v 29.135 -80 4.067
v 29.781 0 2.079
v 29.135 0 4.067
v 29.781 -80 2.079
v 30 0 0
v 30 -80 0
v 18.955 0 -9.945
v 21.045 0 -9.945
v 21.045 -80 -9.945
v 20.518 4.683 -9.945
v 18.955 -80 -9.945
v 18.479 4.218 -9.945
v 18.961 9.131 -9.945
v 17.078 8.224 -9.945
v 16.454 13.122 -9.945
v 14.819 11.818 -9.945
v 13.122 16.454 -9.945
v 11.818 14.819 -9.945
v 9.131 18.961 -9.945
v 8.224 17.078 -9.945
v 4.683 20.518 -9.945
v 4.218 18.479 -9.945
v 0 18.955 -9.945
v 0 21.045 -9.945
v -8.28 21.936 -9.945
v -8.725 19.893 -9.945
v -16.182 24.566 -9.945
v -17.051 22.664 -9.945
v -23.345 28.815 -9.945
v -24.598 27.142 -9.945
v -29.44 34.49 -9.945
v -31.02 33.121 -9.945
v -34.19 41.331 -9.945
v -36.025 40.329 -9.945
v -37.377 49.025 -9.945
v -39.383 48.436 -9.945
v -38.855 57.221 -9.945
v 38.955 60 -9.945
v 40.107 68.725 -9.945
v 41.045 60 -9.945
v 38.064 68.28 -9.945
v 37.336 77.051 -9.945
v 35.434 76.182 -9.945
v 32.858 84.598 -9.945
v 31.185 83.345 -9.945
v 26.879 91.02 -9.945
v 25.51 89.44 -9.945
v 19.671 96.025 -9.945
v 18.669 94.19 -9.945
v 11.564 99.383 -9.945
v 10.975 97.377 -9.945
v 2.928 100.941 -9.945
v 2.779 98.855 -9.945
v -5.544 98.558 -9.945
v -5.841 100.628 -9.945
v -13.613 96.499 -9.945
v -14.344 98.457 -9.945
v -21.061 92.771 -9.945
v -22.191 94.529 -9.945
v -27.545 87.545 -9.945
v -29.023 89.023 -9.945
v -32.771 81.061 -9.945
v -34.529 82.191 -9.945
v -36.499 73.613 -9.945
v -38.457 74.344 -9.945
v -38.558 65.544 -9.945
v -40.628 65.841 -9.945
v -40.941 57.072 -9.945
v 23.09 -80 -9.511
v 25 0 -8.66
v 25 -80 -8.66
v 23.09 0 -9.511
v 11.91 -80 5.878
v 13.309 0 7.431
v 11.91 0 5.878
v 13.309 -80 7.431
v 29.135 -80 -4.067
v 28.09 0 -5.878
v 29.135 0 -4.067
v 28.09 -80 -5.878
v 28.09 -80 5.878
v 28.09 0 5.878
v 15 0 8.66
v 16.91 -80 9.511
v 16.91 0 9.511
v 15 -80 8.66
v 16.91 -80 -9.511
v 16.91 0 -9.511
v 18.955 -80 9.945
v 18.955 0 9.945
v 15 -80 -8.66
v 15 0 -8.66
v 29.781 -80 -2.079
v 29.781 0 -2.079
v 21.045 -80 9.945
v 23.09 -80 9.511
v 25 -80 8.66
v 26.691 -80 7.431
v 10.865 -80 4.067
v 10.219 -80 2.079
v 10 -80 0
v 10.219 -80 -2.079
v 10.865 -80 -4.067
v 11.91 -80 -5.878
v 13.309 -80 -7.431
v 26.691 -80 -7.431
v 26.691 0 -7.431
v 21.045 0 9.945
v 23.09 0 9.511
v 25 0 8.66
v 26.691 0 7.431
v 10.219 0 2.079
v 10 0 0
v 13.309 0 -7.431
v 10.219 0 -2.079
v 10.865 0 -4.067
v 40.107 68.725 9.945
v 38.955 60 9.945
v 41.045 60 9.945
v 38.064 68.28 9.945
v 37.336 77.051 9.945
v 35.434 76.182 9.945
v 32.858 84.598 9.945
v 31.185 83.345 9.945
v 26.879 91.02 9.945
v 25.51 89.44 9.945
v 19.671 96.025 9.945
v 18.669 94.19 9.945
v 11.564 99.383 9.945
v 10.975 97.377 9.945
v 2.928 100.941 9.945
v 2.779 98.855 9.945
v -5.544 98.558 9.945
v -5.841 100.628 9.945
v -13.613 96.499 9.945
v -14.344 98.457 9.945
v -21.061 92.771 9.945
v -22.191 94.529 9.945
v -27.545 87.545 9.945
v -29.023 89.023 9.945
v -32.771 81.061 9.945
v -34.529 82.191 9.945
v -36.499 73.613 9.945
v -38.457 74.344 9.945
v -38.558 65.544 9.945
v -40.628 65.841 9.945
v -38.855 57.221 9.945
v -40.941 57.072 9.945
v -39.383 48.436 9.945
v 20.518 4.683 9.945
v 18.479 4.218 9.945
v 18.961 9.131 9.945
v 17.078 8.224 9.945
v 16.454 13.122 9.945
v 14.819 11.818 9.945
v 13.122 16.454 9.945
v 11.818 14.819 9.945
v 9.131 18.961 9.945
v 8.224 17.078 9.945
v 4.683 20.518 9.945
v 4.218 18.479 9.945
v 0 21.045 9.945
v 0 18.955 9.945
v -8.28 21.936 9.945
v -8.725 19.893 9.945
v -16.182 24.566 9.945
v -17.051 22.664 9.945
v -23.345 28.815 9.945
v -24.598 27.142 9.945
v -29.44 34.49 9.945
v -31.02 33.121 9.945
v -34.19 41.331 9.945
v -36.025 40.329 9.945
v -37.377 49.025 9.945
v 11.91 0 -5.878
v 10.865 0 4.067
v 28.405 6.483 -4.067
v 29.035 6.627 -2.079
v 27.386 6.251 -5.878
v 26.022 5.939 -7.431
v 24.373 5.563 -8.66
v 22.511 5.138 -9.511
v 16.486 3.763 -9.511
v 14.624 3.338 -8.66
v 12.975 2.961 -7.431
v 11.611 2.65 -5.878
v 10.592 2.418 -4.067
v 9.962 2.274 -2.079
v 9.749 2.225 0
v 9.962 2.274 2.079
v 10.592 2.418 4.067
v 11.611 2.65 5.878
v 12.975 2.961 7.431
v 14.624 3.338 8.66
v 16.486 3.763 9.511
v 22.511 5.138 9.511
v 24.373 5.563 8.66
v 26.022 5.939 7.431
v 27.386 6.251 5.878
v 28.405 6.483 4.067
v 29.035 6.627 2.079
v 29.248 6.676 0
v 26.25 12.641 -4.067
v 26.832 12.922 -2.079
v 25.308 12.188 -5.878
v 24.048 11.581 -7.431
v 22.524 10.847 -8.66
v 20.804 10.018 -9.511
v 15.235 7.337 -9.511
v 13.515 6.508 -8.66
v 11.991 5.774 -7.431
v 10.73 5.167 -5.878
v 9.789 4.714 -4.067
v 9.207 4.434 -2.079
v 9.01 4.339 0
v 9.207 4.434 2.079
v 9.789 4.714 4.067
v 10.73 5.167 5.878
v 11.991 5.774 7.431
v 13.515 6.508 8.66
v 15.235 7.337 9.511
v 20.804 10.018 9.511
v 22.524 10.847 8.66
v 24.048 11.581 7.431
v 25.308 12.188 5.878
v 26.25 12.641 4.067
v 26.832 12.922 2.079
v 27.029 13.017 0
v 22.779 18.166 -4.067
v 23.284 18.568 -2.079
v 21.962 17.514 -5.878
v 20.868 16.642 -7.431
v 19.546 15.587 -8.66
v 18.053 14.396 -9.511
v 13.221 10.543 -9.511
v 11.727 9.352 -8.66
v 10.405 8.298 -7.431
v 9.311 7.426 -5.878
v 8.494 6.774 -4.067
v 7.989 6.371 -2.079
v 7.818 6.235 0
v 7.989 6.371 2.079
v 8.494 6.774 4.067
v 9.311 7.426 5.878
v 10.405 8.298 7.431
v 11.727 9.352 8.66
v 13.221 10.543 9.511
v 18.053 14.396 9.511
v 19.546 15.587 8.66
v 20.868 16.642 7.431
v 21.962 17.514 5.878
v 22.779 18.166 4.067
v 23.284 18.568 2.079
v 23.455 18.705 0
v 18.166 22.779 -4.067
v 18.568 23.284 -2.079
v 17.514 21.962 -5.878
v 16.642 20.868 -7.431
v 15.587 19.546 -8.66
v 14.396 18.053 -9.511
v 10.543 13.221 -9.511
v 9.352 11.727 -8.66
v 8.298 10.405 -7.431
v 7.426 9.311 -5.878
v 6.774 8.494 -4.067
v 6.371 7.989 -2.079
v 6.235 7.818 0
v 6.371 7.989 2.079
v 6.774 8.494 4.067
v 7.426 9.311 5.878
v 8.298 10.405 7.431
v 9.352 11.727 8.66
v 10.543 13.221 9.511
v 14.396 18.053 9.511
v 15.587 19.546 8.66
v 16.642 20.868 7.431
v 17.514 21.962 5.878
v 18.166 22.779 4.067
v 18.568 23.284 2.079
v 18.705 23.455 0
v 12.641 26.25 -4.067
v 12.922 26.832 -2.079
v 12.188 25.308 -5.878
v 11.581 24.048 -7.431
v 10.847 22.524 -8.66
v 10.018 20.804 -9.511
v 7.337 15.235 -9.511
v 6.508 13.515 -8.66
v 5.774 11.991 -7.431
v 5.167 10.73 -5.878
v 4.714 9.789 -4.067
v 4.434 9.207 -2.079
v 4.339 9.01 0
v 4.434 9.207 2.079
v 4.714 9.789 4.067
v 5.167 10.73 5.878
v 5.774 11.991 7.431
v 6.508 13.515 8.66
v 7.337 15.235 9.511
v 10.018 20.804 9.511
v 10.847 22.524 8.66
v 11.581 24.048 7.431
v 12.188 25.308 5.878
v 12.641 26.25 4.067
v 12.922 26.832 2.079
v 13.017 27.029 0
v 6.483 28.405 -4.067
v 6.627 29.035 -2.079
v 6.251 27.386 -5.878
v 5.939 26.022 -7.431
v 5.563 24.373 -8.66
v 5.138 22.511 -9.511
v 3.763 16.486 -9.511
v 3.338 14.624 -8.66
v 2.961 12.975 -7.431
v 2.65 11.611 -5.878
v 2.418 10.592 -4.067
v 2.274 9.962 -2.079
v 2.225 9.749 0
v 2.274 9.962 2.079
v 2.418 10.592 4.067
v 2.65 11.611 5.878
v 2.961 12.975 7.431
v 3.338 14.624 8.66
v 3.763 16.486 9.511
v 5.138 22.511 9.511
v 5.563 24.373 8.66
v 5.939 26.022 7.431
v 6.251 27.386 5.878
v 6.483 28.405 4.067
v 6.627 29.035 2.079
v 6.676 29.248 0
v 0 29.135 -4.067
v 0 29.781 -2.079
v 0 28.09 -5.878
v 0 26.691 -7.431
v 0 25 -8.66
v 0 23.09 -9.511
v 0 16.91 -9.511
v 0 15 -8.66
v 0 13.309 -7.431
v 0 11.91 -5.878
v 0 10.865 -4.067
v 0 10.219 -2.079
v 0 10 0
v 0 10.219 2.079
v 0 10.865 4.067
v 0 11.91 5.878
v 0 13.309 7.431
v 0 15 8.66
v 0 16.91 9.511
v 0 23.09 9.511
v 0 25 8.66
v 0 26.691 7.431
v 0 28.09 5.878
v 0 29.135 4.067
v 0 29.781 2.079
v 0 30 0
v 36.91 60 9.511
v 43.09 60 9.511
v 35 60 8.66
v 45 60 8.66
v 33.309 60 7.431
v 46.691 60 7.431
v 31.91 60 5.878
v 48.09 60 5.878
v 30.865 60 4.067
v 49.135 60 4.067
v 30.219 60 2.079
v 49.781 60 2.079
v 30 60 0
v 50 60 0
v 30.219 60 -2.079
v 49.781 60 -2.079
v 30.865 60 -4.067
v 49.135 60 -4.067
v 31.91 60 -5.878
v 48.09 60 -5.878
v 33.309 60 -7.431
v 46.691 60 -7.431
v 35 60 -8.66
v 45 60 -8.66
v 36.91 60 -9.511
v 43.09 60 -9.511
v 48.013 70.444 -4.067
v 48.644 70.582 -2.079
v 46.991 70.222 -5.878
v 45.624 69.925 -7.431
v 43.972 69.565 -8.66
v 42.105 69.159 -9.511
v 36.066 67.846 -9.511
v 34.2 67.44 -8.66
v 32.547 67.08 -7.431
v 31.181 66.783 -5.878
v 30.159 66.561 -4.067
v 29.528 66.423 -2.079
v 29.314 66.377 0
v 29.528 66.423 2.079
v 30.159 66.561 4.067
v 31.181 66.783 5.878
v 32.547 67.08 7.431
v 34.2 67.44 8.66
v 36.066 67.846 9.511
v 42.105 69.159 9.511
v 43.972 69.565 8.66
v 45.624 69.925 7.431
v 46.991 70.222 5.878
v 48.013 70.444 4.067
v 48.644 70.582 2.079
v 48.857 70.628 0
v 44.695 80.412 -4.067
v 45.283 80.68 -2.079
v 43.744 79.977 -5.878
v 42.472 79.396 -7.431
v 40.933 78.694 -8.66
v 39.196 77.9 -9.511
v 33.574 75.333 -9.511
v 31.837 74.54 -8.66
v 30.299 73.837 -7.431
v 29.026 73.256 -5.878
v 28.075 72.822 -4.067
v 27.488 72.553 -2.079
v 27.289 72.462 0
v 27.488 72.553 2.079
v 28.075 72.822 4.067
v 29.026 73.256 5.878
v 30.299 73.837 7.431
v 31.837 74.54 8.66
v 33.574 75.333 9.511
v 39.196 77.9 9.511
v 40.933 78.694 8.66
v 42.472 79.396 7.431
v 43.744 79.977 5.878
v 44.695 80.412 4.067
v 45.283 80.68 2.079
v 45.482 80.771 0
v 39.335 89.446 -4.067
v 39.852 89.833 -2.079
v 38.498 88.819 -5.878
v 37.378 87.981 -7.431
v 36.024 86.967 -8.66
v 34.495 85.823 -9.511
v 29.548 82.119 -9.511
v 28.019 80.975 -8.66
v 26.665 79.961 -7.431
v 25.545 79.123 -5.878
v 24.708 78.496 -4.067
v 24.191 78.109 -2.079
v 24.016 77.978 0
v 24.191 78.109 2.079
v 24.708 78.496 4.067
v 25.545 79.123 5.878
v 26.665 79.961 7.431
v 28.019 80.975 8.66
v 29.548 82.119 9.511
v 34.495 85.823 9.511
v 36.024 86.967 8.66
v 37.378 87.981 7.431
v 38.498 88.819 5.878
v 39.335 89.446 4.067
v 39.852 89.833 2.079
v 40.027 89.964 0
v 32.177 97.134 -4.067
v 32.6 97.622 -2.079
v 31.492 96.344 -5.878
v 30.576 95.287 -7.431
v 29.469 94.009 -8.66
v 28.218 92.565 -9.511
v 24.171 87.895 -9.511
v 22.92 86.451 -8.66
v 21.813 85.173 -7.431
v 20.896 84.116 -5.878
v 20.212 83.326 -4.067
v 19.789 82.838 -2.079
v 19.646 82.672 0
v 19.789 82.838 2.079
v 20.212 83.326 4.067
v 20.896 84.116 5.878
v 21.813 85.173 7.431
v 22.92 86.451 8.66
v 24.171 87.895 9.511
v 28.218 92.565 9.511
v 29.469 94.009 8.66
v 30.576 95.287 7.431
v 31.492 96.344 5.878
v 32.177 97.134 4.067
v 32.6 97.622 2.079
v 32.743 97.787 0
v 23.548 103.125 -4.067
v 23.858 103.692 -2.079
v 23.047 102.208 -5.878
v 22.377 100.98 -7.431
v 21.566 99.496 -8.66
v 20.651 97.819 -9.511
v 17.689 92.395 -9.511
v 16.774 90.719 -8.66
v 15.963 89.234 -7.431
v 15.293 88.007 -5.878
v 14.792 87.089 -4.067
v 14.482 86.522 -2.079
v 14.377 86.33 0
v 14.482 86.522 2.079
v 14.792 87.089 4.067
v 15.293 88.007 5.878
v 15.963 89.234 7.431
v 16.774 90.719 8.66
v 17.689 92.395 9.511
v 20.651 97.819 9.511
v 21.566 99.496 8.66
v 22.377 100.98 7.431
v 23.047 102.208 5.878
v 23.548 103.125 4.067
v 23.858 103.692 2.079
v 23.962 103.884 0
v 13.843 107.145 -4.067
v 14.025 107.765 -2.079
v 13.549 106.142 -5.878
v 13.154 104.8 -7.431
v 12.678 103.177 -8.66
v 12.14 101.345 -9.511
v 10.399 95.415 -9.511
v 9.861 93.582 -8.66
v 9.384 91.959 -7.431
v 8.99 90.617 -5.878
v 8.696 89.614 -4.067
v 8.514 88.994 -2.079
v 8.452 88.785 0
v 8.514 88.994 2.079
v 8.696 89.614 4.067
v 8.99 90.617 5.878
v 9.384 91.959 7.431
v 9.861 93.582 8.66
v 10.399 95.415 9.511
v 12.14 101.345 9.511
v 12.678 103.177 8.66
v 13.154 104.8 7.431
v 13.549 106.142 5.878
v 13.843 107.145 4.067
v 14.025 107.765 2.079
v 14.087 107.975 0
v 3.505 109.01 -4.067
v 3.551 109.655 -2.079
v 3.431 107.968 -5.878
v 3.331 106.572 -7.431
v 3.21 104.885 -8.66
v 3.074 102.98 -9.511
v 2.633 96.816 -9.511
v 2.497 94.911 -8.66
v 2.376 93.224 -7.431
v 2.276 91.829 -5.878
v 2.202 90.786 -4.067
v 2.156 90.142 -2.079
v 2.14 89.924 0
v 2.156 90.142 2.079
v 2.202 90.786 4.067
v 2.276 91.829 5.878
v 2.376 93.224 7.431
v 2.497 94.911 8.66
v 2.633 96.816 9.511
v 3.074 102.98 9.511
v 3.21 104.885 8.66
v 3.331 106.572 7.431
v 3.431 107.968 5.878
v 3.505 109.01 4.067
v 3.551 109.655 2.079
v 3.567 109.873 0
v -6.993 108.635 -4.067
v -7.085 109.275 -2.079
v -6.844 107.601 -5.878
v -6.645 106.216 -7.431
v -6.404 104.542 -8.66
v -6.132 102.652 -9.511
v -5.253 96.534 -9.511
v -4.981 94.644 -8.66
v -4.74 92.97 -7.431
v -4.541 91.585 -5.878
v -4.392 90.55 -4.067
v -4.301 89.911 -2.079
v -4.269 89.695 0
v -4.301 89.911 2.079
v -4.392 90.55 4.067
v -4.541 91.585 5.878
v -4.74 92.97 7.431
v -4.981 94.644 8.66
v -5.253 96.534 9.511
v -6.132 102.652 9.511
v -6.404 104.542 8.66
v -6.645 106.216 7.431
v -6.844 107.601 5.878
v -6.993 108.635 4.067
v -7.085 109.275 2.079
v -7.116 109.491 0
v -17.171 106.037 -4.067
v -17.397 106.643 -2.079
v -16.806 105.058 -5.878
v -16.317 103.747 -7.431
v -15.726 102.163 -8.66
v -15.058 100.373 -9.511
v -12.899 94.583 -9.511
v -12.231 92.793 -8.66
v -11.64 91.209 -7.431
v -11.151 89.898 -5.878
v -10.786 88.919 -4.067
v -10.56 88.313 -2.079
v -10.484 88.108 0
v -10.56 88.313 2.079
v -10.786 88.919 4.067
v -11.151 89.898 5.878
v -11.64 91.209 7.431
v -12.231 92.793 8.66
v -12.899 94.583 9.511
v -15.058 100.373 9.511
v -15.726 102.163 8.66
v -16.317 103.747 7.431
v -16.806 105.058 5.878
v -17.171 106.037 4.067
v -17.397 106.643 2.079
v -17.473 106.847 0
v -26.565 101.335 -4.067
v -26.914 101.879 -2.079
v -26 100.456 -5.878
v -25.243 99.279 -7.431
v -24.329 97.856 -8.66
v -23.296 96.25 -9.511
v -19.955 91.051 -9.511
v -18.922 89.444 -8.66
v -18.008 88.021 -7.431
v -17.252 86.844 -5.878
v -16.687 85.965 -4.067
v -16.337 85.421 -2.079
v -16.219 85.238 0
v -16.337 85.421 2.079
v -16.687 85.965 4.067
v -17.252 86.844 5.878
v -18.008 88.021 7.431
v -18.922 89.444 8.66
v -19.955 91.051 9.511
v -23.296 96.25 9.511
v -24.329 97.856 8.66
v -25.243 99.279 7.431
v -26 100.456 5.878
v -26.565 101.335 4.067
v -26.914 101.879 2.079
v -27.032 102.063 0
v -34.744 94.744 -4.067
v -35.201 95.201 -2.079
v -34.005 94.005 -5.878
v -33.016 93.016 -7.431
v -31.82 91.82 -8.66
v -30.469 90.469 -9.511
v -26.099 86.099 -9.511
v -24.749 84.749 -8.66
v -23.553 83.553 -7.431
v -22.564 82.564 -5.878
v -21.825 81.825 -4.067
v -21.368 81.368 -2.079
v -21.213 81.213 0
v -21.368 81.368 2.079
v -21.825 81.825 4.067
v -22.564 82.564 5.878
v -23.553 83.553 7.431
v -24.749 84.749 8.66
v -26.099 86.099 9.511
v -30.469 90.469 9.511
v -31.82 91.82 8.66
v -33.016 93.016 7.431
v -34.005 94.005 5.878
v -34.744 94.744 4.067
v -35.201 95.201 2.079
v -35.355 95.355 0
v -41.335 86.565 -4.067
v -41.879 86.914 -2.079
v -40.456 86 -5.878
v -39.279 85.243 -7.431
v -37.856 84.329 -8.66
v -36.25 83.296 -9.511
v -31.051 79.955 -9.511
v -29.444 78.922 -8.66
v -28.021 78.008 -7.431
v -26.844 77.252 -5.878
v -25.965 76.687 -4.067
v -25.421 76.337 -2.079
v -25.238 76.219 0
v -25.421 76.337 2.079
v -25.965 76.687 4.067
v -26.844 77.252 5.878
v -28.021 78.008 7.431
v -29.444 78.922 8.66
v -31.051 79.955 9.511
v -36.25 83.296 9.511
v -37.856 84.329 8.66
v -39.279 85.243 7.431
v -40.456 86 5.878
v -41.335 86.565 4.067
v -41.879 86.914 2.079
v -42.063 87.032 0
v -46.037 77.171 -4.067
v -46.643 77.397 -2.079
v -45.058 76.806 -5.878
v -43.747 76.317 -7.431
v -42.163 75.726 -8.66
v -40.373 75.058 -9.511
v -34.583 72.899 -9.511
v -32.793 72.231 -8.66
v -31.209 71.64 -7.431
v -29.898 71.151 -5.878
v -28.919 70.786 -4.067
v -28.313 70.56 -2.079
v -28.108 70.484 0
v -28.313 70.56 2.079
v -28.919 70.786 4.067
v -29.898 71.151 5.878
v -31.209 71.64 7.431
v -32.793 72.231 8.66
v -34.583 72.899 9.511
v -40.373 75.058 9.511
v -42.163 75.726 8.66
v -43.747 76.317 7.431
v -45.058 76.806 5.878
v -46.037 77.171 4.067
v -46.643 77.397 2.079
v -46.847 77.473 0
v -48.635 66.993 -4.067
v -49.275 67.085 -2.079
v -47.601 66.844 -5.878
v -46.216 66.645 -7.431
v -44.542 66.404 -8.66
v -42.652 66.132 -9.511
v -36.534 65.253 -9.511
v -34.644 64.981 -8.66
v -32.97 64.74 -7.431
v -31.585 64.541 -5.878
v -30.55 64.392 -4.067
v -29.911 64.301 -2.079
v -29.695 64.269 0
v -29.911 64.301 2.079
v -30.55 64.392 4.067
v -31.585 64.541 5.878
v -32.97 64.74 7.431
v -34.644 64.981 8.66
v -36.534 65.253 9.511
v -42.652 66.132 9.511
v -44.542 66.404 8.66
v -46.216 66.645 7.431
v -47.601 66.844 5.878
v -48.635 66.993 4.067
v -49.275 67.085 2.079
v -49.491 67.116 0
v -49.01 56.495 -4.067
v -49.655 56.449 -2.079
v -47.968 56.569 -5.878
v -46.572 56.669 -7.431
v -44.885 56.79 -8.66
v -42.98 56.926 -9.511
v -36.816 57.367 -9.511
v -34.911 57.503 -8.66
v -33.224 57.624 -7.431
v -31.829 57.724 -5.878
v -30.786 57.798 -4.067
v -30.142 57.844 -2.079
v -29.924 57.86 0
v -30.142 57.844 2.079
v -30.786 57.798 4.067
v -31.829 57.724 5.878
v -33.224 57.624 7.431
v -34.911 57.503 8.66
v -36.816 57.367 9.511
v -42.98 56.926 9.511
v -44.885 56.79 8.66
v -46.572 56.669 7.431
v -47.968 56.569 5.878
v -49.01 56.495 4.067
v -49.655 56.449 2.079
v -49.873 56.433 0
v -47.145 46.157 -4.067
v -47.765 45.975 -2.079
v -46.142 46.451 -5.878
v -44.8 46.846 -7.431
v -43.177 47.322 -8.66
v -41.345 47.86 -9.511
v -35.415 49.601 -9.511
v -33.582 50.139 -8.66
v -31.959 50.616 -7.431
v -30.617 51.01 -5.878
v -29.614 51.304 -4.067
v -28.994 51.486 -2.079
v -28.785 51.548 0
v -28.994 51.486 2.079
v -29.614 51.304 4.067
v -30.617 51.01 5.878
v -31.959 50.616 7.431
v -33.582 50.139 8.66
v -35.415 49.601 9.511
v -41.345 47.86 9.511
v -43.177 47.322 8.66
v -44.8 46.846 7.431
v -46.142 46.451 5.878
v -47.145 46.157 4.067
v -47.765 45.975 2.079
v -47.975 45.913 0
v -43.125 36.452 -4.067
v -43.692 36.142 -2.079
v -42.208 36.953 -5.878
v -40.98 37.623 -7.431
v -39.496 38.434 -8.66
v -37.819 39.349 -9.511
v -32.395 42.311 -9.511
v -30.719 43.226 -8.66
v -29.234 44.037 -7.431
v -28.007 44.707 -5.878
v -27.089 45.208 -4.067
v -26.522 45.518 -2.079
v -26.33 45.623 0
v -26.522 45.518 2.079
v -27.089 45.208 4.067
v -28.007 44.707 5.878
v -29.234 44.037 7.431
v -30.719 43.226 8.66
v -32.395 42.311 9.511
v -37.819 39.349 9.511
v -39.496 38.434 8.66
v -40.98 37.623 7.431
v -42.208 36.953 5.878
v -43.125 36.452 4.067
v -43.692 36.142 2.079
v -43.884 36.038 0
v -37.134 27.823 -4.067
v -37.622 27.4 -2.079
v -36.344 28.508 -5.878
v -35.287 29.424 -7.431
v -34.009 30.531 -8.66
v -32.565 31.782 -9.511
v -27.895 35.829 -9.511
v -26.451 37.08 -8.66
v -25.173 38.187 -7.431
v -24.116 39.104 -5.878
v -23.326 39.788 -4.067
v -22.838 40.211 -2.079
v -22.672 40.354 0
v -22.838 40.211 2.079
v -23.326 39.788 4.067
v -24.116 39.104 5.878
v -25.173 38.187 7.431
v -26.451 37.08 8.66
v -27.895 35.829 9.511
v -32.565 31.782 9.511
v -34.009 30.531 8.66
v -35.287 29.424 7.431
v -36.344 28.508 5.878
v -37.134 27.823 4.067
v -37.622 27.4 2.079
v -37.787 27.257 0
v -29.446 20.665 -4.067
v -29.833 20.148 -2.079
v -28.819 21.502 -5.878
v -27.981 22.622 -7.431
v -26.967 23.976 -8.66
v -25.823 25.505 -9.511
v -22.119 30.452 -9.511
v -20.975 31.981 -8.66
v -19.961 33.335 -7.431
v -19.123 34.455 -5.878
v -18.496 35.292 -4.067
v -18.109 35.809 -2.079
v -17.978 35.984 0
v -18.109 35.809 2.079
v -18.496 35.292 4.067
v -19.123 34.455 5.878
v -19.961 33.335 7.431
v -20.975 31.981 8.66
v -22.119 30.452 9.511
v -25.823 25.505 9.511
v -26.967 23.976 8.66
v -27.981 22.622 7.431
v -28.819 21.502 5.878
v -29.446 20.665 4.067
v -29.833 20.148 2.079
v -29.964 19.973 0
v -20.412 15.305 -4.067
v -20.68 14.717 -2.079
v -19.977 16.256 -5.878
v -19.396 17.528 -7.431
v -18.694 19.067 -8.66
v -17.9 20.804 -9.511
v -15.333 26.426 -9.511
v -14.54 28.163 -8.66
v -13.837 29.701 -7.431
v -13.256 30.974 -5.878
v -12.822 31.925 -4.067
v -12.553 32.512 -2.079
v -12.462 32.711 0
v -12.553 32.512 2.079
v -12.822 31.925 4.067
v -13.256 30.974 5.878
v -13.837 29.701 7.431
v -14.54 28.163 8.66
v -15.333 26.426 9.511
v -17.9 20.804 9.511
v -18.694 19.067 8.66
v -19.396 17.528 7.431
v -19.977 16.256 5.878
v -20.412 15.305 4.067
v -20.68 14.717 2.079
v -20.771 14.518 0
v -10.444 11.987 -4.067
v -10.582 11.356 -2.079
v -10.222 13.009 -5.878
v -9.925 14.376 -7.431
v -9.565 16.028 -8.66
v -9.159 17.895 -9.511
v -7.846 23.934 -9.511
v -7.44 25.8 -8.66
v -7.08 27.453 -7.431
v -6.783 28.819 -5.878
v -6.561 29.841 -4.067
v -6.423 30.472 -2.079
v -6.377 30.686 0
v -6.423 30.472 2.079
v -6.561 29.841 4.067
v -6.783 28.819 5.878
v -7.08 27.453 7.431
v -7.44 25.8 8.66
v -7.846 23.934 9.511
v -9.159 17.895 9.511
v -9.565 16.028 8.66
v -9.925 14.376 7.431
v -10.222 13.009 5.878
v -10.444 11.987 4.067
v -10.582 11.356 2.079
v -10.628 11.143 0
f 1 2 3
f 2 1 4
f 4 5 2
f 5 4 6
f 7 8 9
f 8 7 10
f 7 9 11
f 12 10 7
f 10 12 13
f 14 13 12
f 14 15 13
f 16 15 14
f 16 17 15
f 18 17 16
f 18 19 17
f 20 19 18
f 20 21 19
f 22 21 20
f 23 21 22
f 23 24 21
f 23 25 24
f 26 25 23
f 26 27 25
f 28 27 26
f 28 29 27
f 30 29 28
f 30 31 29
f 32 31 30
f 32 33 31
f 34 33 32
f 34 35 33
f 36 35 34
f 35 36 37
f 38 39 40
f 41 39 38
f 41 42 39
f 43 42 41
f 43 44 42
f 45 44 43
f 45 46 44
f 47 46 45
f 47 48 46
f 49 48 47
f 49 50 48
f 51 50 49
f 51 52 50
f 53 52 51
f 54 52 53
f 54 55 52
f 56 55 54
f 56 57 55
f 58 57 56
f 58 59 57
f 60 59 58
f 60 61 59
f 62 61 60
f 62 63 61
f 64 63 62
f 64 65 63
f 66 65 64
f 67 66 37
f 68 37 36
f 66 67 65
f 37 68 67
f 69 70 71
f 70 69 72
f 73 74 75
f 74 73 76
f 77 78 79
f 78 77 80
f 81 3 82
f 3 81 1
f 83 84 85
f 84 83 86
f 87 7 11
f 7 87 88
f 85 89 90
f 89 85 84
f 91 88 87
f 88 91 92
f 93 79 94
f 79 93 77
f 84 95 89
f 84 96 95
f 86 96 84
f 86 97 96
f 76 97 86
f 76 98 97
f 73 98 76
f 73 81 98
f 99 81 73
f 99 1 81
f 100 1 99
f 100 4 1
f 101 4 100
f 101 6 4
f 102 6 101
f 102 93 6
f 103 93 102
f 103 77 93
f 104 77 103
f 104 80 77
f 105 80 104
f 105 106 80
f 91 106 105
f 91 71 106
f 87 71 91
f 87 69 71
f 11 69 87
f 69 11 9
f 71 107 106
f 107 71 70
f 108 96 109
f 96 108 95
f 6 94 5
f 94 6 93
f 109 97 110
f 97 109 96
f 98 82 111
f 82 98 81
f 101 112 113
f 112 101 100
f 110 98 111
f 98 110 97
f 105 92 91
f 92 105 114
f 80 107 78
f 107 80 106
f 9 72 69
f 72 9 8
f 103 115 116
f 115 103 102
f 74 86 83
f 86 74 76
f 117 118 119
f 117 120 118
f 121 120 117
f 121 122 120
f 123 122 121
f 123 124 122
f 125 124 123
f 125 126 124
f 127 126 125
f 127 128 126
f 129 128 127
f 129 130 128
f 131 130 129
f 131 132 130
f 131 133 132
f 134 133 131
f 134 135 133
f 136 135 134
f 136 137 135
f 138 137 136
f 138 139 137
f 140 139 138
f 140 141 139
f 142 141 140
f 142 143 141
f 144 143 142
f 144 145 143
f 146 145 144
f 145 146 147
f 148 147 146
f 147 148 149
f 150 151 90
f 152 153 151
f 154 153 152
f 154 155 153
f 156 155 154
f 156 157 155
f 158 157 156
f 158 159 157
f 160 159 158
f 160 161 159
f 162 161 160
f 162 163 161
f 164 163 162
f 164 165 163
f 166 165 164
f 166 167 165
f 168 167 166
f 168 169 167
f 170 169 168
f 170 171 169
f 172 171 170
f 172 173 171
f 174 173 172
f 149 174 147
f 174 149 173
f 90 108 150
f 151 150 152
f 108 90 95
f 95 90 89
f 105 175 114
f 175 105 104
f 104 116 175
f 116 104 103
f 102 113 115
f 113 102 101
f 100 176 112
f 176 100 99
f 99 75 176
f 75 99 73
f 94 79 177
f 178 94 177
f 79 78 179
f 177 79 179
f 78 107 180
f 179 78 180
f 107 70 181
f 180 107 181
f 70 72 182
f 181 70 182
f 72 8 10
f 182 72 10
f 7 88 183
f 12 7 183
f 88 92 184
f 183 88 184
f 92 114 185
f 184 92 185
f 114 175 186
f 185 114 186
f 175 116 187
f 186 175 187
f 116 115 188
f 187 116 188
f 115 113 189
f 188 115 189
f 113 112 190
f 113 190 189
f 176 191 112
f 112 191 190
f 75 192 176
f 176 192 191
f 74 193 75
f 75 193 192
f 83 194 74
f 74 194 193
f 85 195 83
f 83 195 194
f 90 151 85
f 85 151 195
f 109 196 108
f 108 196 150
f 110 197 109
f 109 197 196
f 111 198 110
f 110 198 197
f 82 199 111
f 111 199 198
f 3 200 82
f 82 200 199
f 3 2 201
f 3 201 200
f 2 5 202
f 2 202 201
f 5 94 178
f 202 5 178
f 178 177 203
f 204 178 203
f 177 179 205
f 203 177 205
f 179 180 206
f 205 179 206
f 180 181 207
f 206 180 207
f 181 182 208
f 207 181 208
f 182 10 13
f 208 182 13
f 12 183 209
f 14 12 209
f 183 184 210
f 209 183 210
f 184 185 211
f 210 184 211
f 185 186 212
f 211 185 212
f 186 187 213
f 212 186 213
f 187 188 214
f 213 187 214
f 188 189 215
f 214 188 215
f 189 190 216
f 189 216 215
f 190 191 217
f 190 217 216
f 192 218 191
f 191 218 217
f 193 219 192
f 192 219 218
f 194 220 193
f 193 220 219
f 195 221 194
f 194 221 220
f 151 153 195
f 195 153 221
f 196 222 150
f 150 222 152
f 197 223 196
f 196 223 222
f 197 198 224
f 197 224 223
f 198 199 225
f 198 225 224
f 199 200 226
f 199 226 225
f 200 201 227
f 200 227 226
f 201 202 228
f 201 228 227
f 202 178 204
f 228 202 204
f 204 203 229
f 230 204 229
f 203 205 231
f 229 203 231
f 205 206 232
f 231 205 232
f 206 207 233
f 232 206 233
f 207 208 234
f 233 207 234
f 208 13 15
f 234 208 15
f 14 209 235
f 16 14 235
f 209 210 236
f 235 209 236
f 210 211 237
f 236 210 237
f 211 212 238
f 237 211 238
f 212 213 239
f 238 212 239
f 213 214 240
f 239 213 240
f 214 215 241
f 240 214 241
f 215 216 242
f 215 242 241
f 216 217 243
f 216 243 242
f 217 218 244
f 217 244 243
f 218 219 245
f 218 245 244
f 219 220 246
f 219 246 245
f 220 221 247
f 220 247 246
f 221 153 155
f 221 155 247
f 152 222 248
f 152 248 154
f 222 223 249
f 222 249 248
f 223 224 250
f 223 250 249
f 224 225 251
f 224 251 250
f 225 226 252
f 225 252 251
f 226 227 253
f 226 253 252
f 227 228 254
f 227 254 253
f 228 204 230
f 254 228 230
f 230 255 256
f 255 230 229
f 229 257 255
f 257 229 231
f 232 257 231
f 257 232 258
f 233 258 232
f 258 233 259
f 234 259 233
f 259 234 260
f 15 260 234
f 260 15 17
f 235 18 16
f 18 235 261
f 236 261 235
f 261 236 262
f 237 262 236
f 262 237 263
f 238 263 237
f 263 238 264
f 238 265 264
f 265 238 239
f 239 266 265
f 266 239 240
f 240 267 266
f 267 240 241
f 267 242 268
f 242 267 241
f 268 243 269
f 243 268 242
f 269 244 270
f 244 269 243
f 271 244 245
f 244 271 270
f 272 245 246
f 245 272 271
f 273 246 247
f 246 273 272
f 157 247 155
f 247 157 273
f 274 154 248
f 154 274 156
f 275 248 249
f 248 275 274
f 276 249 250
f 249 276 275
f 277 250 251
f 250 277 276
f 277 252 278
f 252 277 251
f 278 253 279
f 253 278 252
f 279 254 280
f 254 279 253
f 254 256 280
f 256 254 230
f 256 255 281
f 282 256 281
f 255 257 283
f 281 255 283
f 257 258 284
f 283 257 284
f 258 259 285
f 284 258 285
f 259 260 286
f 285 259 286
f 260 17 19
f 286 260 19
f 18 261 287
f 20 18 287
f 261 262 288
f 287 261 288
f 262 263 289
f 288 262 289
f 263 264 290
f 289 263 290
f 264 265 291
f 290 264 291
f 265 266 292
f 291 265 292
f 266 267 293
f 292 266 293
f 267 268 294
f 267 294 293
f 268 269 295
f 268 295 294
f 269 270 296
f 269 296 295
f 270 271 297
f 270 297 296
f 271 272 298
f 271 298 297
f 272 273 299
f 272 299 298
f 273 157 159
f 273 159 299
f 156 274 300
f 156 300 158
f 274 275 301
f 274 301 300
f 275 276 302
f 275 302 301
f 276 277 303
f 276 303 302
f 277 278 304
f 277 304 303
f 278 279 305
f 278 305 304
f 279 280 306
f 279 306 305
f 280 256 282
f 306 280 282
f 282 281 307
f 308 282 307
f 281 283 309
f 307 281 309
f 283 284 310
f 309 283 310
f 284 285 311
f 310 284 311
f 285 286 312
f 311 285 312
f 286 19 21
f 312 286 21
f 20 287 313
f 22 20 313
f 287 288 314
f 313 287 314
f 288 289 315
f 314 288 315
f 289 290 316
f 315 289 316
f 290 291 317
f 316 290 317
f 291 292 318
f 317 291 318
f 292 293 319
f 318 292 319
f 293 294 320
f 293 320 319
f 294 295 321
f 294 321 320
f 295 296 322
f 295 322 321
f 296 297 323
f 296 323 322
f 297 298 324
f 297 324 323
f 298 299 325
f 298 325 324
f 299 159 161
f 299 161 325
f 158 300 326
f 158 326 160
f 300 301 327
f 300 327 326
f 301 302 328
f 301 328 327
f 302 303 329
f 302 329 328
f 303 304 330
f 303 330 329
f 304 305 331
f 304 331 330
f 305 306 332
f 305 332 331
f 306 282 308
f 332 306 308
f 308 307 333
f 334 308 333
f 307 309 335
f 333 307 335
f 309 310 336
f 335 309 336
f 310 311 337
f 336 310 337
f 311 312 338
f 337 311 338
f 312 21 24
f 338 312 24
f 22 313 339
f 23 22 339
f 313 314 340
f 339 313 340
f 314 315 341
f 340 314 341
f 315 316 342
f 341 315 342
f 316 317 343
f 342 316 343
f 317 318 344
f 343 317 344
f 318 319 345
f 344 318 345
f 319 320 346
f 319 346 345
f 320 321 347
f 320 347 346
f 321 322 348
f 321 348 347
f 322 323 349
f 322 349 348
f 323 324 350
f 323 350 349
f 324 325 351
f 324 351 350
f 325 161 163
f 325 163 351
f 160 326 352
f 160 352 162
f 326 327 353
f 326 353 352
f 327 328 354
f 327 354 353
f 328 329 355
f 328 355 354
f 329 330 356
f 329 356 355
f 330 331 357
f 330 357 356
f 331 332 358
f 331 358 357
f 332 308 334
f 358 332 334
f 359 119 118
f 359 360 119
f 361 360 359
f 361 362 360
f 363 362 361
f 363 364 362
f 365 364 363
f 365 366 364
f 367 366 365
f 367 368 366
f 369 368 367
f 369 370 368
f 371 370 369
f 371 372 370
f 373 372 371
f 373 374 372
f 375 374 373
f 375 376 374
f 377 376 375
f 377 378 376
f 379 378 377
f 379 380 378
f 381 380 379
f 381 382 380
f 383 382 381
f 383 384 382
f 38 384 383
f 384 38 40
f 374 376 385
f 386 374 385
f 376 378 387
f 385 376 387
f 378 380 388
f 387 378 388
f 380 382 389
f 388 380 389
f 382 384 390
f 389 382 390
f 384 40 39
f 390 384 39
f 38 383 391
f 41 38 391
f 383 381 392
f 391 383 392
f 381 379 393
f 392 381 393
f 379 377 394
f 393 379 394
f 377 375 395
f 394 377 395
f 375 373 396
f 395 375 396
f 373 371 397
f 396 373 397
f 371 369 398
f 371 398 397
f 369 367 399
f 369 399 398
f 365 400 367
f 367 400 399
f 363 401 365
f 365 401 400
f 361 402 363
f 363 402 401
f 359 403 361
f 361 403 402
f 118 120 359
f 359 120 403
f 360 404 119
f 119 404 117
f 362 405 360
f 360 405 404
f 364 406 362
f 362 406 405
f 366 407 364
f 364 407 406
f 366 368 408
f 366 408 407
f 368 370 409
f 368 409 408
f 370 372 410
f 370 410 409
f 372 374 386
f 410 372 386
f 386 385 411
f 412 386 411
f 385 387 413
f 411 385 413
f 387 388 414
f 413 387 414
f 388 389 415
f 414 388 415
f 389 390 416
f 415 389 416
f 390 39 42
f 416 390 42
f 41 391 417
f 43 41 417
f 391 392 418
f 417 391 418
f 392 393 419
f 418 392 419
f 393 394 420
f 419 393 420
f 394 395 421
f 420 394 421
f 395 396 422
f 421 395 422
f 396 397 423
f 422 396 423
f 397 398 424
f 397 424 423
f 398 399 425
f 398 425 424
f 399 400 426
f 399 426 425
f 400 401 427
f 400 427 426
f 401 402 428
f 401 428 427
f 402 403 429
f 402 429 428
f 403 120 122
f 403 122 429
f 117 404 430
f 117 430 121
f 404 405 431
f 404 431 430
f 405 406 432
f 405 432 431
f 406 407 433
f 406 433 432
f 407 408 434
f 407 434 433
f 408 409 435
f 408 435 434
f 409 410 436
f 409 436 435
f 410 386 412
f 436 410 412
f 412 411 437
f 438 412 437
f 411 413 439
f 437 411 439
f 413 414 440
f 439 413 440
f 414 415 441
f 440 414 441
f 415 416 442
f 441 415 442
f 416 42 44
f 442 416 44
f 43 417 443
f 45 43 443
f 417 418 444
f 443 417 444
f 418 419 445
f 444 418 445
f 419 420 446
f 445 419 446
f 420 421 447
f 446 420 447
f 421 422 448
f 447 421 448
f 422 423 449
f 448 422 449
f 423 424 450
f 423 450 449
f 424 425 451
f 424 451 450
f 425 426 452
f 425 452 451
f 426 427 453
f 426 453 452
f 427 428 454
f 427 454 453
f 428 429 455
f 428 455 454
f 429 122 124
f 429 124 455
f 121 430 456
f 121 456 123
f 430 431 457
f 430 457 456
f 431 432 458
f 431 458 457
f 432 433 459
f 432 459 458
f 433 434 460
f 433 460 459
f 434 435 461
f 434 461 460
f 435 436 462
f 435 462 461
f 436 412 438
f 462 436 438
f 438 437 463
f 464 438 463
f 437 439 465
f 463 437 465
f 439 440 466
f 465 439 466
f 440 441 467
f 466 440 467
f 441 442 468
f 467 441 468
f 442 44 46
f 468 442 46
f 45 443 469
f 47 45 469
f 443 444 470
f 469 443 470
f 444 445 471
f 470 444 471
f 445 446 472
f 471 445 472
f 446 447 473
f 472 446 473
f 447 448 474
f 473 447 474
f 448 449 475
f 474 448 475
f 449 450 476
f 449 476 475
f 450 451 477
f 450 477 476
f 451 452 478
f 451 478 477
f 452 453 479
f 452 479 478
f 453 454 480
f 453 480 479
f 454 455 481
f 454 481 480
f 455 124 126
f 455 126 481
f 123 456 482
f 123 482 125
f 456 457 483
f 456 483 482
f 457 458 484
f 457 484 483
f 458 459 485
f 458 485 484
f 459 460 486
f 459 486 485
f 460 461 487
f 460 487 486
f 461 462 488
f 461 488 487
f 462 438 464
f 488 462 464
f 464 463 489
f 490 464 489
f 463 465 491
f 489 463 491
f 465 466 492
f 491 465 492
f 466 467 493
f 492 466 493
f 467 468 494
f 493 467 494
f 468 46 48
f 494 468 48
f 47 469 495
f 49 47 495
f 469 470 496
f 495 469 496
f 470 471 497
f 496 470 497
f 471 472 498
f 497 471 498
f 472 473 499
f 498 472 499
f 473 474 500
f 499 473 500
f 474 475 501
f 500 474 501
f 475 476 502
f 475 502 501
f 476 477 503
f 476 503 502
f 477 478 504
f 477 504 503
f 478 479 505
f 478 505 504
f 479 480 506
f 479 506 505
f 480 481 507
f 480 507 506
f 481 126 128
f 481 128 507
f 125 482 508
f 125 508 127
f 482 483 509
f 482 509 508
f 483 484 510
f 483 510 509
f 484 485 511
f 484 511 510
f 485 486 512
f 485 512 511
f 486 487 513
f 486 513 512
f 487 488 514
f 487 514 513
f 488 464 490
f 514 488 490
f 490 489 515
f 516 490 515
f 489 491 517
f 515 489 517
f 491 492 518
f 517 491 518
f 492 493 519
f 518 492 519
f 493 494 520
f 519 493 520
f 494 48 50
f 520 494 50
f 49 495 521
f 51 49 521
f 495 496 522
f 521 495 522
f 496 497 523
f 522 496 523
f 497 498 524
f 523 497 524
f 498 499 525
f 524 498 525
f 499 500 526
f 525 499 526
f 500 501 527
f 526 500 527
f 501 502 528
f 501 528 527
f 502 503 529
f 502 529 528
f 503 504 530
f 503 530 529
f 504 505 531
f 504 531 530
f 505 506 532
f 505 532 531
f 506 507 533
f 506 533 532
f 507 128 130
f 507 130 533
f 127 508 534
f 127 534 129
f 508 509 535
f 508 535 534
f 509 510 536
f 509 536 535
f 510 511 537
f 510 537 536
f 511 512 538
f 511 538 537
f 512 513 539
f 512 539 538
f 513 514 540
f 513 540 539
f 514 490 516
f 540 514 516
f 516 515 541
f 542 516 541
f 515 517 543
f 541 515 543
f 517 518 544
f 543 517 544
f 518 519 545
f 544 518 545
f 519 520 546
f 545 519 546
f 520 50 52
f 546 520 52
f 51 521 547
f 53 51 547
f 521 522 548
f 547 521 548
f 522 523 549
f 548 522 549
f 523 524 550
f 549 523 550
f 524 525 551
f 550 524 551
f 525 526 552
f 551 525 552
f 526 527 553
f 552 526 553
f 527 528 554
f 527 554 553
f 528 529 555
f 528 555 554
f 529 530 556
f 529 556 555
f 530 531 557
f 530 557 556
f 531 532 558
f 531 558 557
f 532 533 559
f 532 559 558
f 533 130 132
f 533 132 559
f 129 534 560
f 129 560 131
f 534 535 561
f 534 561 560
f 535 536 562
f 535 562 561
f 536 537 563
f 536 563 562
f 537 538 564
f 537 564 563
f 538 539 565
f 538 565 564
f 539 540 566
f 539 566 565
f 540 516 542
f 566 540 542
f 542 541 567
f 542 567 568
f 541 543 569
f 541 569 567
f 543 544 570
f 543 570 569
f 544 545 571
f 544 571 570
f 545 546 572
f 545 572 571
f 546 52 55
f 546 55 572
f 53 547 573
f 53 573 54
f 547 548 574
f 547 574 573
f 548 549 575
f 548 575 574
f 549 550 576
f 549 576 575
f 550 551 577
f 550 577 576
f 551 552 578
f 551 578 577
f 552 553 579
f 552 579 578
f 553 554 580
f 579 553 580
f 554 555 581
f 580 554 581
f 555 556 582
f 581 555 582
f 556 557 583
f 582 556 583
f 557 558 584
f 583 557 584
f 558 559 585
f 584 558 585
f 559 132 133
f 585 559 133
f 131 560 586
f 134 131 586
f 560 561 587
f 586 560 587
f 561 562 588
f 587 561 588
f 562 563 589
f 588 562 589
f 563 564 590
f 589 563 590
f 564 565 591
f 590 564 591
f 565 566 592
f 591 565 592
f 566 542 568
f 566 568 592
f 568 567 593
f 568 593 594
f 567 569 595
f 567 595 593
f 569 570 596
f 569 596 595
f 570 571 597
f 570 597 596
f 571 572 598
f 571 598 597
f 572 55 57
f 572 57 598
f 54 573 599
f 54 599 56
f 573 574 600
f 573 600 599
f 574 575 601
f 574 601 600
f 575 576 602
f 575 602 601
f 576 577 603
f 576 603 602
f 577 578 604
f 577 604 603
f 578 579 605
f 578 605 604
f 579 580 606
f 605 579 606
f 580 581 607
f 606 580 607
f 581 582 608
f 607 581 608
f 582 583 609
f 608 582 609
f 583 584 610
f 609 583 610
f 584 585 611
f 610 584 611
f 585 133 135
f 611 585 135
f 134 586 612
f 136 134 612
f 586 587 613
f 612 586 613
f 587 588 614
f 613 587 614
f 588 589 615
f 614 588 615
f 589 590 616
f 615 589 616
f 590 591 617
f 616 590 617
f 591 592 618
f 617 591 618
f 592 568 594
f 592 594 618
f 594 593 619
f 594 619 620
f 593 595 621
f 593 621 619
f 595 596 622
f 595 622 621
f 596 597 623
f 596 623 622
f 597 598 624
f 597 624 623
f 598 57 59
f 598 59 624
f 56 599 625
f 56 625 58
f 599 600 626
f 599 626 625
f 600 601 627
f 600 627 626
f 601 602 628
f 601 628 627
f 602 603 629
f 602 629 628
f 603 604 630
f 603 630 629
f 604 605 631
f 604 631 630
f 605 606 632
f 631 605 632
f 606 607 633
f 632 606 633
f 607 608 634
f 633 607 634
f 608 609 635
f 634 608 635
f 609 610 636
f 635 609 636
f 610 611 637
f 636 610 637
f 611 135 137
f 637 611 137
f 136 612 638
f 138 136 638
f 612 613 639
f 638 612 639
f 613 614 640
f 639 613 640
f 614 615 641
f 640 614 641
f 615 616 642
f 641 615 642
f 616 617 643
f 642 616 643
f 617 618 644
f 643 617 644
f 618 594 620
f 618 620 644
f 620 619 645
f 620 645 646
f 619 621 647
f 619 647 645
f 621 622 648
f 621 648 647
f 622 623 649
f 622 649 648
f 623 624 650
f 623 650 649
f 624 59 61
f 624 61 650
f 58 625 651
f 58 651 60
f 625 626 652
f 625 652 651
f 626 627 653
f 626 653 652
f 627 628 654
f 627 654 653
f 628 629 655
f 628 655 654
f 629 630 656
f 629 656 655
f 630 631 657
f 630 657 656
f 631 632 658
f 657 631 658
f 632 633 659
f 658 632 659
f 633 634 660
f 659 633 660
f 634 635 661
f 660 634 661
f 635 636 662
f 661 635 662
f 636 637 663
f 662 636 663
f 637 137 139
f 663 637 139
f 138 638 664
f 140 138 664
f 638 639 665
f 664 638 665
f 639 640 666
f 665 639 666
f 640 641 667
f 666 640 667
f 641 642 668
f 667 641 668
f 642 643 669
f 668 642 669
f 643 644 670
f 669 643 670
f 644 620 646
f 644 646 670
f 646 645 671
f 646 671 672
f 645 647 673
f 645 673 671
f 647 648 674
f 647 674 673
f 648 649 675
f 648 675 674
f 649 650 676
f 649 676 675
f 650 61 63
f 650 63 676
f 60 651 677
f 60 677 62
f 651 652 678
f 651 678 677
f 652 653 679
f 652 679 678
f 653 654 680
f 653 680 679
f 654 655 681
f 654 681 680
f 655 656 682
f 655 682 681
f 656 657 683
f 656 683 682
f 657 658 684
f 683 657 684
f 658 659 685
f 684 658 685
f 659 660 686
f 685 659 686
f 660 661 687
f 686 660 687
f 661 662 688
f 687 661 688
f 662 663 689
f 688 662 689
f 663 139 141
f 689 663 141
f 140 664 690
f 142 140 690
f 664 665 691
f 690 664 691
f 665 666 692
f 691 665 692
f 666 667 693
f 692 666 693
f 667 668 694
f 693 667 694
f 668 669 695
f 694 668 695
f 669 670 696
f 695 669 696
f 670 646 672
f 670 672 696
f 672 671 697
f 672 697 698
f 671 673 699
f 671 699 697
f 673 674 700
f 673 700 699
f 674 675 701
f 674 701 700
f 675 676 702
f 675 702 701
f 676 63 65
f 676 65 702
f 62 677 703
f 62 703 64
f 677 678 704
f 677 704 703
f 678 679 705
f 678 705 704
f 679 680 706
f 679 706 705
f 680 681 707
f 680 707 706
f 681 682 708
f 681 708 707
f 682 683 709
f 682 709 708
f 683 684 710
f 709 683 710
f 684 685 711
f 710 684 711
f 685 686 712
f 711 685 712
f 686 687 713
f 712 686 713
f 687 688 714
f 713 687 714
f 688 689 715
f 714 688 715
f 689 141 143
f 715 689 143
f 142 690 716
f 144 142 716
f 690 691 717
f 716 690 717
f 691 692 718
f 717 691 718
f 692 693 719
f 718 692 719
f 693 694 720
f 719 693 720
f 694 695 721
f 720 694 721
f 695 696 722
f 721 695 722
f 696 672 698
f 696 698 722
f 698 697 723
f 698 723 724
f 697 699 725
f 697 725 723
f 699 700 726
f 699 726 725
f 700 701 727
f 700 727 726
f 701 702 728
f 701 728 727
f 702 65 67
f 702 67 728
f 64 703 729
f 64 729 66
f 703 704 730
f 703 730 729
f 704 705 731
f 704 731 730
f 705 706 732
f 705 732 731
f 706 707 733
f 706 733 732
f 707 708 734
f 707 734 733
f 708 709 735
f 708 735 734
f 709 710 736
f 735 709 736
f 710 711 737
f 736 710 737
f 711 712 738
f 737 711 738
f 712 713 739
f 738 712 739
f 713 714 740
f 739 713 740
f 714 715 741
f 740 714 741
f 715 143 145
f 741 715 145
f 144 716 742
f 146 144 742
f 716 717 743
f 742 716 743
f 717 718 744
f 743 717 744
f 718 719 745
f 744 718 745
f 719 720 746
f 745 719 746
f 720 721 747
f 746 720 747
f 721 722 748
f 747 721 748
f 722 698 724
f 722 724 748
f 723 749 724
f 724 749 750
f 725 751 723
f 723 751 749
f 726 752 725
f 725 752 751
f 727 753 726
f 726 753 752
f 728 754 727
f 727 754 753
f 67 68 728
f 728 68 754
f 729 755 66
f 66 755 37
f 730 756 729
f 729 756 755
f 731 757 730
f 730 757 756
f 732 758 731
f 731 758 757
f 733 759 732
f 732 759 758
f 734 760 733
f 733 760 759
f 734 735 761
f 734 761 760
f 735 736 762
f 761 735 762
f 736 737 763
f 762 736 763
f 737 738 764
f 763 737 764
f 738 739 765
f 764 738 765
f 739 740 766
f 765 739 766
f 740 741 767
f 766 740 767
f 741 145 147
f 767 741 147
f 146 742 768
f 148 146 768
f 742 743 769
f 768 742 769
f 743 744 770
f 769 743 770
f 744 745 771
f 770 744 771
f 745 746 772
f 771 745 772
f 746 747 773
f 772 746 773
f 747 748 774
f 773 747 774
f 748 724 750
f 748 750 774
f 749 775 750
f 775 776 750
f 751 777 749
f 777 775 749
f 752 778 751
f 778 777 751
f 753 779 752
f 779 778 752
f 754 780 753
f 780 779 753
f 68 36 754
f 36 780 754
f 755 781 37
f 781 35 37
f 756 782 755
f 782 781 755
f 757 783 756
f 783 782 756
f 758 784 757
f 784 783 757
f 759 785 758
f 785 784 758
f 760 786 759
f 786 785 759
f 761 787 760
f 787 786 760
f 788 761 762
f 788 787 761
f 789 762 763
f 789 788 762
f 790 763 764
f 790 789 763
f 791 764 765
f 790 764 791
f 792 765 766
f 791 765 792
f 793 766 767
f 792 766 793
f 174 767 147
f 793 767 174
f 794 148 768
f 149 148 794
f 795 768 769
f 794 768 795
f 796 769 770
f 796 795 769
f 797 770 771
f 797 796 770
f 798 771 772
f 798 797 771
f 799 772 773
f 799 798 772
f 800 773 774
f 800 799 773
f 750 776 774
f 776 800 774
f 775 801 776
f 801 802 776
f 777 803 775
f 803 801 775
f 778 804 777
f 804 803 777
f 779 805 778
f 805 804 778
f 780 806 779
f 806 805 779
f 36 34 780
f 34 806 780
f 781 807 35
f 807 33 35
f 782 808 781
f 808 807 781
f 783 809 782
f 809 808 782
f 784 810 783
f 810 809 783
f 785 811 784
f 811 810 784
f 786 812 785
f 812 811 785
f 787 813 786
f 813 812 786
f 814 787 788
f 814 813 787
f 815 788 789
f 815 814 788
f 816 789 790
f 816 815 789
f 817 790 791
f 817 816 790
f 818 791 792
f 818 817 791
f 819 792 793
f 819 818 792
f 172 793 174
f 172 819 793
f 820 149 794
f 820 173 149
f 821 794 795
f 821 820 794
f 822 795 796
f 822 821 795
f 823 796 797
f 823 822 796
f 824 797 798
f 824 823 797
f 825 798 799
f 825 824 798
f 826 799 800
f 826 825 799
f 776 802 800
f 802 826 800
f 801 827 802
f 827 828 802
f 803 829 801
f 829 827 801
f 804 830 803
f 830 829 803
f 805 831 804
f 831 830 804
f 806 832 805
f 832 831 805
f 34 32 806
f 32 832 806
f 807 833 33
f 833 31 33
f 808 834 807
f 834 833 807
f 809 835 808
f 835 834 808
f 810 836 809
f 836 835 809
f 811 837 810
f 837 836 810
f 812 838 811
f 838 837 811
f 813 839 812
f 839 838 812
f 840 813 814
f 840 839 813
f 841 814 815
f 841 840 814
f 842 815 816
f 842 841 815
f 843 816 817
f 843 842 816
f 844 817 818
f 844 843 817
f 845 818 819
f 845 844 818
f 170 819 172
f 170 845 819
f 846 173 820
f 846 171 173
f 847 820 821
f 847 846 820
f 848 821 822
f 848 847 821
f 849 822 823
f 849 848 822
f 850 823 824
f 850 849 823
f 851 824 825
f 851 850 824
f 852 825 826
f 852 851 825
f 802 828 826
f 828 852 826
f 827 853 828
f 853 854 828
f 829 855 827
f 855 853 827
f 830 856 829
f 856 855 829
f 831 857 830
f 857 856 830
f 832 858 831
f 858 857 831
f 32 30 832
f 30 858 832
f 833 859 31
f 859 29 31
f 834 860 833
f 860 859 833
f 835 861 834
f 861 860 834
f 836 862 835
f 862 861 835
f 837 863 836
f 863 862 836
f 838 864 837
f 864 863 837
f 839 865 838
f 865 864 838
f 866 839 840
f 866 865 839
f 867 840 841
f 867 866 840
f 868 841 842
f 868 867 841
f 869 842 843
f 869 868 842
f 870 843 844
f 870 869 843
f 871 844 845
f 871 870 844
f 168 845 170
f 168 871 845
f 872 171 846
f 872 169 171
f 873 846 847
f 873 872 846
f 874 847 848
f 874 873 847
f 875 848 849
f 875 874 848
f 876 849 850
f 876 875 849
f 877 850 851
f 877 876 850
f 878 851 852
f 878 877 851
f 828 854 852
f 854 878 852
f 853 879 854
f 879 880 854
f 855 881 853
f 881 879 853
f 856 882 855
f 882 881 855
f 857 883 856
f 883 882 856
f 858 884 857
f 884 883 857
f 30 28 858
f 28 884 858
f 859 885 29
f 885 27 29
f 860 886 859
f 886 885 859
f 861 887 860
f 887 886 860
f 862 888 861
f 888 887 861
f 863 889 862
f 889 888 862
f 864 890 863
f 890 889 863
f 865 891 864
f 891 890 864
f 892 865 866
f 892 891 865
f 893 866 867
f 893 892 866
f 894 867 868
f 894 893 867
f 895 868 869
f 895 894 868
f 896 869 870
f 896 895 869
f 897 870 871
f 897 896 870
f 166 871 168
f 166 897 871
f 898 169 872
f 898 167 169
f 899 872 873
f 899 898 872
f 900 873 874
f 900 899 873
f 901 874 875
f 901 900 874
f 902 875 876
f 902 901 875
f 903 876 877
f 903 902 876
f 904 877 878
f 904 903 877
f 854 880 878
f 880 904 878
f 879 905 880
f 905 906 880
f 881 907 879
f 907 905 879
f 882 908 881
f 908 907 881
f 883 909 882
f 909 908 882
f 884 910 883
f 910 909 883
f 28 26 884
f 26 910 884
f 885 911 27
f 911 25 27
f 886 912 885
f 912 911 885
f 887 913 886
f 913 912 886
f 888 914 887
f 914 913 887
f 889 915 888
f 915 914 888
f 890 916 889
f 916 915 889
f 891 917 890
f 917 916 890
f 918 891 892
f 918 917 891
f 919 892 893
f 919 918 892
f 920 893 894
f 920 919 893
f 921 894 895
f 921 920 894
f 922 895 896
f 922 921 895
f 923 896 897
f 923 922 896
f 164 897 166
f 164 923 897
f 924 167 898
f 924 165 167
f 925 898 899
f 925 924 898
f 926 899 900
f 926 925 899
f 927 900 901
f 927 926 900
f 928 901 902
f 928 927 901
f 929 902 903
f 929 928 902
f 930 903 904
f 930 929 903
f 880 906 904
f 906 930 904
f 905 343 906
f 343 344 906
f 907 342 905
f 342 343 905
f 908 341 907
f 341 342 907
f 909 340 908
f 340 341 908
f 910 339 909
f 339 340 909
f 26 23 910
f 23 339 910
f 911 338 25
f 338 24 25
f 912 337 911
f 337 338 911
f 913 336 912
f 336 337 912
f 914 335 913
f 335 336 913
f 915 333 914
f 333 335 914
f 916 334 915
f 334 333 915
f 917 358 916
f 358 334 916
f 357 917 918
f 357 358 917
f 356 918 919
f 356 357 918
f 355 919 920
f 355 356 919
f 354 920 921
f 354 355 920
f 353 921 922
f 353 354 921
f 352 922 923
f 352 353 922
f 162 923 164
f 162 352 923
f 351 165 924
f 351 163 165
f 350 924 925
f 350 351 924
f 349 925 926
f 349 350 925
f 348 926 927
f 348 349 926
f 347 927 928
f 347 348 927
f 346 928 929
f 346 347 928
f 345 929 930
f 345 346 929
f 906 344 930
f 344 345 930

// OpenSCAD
translate([20,0,0]){ 
   rotate([90,0,0]){
       cylinder(r=10,h=80);
   }
}

rotate_extrude(angle=90){
   translate([20, 0]){
       circle(10);
   }
}

translate([0,60,0]){
   rotate_extrude(angle=270){
       translate([40, 0]){
           circle(10);
       }
   }
}
